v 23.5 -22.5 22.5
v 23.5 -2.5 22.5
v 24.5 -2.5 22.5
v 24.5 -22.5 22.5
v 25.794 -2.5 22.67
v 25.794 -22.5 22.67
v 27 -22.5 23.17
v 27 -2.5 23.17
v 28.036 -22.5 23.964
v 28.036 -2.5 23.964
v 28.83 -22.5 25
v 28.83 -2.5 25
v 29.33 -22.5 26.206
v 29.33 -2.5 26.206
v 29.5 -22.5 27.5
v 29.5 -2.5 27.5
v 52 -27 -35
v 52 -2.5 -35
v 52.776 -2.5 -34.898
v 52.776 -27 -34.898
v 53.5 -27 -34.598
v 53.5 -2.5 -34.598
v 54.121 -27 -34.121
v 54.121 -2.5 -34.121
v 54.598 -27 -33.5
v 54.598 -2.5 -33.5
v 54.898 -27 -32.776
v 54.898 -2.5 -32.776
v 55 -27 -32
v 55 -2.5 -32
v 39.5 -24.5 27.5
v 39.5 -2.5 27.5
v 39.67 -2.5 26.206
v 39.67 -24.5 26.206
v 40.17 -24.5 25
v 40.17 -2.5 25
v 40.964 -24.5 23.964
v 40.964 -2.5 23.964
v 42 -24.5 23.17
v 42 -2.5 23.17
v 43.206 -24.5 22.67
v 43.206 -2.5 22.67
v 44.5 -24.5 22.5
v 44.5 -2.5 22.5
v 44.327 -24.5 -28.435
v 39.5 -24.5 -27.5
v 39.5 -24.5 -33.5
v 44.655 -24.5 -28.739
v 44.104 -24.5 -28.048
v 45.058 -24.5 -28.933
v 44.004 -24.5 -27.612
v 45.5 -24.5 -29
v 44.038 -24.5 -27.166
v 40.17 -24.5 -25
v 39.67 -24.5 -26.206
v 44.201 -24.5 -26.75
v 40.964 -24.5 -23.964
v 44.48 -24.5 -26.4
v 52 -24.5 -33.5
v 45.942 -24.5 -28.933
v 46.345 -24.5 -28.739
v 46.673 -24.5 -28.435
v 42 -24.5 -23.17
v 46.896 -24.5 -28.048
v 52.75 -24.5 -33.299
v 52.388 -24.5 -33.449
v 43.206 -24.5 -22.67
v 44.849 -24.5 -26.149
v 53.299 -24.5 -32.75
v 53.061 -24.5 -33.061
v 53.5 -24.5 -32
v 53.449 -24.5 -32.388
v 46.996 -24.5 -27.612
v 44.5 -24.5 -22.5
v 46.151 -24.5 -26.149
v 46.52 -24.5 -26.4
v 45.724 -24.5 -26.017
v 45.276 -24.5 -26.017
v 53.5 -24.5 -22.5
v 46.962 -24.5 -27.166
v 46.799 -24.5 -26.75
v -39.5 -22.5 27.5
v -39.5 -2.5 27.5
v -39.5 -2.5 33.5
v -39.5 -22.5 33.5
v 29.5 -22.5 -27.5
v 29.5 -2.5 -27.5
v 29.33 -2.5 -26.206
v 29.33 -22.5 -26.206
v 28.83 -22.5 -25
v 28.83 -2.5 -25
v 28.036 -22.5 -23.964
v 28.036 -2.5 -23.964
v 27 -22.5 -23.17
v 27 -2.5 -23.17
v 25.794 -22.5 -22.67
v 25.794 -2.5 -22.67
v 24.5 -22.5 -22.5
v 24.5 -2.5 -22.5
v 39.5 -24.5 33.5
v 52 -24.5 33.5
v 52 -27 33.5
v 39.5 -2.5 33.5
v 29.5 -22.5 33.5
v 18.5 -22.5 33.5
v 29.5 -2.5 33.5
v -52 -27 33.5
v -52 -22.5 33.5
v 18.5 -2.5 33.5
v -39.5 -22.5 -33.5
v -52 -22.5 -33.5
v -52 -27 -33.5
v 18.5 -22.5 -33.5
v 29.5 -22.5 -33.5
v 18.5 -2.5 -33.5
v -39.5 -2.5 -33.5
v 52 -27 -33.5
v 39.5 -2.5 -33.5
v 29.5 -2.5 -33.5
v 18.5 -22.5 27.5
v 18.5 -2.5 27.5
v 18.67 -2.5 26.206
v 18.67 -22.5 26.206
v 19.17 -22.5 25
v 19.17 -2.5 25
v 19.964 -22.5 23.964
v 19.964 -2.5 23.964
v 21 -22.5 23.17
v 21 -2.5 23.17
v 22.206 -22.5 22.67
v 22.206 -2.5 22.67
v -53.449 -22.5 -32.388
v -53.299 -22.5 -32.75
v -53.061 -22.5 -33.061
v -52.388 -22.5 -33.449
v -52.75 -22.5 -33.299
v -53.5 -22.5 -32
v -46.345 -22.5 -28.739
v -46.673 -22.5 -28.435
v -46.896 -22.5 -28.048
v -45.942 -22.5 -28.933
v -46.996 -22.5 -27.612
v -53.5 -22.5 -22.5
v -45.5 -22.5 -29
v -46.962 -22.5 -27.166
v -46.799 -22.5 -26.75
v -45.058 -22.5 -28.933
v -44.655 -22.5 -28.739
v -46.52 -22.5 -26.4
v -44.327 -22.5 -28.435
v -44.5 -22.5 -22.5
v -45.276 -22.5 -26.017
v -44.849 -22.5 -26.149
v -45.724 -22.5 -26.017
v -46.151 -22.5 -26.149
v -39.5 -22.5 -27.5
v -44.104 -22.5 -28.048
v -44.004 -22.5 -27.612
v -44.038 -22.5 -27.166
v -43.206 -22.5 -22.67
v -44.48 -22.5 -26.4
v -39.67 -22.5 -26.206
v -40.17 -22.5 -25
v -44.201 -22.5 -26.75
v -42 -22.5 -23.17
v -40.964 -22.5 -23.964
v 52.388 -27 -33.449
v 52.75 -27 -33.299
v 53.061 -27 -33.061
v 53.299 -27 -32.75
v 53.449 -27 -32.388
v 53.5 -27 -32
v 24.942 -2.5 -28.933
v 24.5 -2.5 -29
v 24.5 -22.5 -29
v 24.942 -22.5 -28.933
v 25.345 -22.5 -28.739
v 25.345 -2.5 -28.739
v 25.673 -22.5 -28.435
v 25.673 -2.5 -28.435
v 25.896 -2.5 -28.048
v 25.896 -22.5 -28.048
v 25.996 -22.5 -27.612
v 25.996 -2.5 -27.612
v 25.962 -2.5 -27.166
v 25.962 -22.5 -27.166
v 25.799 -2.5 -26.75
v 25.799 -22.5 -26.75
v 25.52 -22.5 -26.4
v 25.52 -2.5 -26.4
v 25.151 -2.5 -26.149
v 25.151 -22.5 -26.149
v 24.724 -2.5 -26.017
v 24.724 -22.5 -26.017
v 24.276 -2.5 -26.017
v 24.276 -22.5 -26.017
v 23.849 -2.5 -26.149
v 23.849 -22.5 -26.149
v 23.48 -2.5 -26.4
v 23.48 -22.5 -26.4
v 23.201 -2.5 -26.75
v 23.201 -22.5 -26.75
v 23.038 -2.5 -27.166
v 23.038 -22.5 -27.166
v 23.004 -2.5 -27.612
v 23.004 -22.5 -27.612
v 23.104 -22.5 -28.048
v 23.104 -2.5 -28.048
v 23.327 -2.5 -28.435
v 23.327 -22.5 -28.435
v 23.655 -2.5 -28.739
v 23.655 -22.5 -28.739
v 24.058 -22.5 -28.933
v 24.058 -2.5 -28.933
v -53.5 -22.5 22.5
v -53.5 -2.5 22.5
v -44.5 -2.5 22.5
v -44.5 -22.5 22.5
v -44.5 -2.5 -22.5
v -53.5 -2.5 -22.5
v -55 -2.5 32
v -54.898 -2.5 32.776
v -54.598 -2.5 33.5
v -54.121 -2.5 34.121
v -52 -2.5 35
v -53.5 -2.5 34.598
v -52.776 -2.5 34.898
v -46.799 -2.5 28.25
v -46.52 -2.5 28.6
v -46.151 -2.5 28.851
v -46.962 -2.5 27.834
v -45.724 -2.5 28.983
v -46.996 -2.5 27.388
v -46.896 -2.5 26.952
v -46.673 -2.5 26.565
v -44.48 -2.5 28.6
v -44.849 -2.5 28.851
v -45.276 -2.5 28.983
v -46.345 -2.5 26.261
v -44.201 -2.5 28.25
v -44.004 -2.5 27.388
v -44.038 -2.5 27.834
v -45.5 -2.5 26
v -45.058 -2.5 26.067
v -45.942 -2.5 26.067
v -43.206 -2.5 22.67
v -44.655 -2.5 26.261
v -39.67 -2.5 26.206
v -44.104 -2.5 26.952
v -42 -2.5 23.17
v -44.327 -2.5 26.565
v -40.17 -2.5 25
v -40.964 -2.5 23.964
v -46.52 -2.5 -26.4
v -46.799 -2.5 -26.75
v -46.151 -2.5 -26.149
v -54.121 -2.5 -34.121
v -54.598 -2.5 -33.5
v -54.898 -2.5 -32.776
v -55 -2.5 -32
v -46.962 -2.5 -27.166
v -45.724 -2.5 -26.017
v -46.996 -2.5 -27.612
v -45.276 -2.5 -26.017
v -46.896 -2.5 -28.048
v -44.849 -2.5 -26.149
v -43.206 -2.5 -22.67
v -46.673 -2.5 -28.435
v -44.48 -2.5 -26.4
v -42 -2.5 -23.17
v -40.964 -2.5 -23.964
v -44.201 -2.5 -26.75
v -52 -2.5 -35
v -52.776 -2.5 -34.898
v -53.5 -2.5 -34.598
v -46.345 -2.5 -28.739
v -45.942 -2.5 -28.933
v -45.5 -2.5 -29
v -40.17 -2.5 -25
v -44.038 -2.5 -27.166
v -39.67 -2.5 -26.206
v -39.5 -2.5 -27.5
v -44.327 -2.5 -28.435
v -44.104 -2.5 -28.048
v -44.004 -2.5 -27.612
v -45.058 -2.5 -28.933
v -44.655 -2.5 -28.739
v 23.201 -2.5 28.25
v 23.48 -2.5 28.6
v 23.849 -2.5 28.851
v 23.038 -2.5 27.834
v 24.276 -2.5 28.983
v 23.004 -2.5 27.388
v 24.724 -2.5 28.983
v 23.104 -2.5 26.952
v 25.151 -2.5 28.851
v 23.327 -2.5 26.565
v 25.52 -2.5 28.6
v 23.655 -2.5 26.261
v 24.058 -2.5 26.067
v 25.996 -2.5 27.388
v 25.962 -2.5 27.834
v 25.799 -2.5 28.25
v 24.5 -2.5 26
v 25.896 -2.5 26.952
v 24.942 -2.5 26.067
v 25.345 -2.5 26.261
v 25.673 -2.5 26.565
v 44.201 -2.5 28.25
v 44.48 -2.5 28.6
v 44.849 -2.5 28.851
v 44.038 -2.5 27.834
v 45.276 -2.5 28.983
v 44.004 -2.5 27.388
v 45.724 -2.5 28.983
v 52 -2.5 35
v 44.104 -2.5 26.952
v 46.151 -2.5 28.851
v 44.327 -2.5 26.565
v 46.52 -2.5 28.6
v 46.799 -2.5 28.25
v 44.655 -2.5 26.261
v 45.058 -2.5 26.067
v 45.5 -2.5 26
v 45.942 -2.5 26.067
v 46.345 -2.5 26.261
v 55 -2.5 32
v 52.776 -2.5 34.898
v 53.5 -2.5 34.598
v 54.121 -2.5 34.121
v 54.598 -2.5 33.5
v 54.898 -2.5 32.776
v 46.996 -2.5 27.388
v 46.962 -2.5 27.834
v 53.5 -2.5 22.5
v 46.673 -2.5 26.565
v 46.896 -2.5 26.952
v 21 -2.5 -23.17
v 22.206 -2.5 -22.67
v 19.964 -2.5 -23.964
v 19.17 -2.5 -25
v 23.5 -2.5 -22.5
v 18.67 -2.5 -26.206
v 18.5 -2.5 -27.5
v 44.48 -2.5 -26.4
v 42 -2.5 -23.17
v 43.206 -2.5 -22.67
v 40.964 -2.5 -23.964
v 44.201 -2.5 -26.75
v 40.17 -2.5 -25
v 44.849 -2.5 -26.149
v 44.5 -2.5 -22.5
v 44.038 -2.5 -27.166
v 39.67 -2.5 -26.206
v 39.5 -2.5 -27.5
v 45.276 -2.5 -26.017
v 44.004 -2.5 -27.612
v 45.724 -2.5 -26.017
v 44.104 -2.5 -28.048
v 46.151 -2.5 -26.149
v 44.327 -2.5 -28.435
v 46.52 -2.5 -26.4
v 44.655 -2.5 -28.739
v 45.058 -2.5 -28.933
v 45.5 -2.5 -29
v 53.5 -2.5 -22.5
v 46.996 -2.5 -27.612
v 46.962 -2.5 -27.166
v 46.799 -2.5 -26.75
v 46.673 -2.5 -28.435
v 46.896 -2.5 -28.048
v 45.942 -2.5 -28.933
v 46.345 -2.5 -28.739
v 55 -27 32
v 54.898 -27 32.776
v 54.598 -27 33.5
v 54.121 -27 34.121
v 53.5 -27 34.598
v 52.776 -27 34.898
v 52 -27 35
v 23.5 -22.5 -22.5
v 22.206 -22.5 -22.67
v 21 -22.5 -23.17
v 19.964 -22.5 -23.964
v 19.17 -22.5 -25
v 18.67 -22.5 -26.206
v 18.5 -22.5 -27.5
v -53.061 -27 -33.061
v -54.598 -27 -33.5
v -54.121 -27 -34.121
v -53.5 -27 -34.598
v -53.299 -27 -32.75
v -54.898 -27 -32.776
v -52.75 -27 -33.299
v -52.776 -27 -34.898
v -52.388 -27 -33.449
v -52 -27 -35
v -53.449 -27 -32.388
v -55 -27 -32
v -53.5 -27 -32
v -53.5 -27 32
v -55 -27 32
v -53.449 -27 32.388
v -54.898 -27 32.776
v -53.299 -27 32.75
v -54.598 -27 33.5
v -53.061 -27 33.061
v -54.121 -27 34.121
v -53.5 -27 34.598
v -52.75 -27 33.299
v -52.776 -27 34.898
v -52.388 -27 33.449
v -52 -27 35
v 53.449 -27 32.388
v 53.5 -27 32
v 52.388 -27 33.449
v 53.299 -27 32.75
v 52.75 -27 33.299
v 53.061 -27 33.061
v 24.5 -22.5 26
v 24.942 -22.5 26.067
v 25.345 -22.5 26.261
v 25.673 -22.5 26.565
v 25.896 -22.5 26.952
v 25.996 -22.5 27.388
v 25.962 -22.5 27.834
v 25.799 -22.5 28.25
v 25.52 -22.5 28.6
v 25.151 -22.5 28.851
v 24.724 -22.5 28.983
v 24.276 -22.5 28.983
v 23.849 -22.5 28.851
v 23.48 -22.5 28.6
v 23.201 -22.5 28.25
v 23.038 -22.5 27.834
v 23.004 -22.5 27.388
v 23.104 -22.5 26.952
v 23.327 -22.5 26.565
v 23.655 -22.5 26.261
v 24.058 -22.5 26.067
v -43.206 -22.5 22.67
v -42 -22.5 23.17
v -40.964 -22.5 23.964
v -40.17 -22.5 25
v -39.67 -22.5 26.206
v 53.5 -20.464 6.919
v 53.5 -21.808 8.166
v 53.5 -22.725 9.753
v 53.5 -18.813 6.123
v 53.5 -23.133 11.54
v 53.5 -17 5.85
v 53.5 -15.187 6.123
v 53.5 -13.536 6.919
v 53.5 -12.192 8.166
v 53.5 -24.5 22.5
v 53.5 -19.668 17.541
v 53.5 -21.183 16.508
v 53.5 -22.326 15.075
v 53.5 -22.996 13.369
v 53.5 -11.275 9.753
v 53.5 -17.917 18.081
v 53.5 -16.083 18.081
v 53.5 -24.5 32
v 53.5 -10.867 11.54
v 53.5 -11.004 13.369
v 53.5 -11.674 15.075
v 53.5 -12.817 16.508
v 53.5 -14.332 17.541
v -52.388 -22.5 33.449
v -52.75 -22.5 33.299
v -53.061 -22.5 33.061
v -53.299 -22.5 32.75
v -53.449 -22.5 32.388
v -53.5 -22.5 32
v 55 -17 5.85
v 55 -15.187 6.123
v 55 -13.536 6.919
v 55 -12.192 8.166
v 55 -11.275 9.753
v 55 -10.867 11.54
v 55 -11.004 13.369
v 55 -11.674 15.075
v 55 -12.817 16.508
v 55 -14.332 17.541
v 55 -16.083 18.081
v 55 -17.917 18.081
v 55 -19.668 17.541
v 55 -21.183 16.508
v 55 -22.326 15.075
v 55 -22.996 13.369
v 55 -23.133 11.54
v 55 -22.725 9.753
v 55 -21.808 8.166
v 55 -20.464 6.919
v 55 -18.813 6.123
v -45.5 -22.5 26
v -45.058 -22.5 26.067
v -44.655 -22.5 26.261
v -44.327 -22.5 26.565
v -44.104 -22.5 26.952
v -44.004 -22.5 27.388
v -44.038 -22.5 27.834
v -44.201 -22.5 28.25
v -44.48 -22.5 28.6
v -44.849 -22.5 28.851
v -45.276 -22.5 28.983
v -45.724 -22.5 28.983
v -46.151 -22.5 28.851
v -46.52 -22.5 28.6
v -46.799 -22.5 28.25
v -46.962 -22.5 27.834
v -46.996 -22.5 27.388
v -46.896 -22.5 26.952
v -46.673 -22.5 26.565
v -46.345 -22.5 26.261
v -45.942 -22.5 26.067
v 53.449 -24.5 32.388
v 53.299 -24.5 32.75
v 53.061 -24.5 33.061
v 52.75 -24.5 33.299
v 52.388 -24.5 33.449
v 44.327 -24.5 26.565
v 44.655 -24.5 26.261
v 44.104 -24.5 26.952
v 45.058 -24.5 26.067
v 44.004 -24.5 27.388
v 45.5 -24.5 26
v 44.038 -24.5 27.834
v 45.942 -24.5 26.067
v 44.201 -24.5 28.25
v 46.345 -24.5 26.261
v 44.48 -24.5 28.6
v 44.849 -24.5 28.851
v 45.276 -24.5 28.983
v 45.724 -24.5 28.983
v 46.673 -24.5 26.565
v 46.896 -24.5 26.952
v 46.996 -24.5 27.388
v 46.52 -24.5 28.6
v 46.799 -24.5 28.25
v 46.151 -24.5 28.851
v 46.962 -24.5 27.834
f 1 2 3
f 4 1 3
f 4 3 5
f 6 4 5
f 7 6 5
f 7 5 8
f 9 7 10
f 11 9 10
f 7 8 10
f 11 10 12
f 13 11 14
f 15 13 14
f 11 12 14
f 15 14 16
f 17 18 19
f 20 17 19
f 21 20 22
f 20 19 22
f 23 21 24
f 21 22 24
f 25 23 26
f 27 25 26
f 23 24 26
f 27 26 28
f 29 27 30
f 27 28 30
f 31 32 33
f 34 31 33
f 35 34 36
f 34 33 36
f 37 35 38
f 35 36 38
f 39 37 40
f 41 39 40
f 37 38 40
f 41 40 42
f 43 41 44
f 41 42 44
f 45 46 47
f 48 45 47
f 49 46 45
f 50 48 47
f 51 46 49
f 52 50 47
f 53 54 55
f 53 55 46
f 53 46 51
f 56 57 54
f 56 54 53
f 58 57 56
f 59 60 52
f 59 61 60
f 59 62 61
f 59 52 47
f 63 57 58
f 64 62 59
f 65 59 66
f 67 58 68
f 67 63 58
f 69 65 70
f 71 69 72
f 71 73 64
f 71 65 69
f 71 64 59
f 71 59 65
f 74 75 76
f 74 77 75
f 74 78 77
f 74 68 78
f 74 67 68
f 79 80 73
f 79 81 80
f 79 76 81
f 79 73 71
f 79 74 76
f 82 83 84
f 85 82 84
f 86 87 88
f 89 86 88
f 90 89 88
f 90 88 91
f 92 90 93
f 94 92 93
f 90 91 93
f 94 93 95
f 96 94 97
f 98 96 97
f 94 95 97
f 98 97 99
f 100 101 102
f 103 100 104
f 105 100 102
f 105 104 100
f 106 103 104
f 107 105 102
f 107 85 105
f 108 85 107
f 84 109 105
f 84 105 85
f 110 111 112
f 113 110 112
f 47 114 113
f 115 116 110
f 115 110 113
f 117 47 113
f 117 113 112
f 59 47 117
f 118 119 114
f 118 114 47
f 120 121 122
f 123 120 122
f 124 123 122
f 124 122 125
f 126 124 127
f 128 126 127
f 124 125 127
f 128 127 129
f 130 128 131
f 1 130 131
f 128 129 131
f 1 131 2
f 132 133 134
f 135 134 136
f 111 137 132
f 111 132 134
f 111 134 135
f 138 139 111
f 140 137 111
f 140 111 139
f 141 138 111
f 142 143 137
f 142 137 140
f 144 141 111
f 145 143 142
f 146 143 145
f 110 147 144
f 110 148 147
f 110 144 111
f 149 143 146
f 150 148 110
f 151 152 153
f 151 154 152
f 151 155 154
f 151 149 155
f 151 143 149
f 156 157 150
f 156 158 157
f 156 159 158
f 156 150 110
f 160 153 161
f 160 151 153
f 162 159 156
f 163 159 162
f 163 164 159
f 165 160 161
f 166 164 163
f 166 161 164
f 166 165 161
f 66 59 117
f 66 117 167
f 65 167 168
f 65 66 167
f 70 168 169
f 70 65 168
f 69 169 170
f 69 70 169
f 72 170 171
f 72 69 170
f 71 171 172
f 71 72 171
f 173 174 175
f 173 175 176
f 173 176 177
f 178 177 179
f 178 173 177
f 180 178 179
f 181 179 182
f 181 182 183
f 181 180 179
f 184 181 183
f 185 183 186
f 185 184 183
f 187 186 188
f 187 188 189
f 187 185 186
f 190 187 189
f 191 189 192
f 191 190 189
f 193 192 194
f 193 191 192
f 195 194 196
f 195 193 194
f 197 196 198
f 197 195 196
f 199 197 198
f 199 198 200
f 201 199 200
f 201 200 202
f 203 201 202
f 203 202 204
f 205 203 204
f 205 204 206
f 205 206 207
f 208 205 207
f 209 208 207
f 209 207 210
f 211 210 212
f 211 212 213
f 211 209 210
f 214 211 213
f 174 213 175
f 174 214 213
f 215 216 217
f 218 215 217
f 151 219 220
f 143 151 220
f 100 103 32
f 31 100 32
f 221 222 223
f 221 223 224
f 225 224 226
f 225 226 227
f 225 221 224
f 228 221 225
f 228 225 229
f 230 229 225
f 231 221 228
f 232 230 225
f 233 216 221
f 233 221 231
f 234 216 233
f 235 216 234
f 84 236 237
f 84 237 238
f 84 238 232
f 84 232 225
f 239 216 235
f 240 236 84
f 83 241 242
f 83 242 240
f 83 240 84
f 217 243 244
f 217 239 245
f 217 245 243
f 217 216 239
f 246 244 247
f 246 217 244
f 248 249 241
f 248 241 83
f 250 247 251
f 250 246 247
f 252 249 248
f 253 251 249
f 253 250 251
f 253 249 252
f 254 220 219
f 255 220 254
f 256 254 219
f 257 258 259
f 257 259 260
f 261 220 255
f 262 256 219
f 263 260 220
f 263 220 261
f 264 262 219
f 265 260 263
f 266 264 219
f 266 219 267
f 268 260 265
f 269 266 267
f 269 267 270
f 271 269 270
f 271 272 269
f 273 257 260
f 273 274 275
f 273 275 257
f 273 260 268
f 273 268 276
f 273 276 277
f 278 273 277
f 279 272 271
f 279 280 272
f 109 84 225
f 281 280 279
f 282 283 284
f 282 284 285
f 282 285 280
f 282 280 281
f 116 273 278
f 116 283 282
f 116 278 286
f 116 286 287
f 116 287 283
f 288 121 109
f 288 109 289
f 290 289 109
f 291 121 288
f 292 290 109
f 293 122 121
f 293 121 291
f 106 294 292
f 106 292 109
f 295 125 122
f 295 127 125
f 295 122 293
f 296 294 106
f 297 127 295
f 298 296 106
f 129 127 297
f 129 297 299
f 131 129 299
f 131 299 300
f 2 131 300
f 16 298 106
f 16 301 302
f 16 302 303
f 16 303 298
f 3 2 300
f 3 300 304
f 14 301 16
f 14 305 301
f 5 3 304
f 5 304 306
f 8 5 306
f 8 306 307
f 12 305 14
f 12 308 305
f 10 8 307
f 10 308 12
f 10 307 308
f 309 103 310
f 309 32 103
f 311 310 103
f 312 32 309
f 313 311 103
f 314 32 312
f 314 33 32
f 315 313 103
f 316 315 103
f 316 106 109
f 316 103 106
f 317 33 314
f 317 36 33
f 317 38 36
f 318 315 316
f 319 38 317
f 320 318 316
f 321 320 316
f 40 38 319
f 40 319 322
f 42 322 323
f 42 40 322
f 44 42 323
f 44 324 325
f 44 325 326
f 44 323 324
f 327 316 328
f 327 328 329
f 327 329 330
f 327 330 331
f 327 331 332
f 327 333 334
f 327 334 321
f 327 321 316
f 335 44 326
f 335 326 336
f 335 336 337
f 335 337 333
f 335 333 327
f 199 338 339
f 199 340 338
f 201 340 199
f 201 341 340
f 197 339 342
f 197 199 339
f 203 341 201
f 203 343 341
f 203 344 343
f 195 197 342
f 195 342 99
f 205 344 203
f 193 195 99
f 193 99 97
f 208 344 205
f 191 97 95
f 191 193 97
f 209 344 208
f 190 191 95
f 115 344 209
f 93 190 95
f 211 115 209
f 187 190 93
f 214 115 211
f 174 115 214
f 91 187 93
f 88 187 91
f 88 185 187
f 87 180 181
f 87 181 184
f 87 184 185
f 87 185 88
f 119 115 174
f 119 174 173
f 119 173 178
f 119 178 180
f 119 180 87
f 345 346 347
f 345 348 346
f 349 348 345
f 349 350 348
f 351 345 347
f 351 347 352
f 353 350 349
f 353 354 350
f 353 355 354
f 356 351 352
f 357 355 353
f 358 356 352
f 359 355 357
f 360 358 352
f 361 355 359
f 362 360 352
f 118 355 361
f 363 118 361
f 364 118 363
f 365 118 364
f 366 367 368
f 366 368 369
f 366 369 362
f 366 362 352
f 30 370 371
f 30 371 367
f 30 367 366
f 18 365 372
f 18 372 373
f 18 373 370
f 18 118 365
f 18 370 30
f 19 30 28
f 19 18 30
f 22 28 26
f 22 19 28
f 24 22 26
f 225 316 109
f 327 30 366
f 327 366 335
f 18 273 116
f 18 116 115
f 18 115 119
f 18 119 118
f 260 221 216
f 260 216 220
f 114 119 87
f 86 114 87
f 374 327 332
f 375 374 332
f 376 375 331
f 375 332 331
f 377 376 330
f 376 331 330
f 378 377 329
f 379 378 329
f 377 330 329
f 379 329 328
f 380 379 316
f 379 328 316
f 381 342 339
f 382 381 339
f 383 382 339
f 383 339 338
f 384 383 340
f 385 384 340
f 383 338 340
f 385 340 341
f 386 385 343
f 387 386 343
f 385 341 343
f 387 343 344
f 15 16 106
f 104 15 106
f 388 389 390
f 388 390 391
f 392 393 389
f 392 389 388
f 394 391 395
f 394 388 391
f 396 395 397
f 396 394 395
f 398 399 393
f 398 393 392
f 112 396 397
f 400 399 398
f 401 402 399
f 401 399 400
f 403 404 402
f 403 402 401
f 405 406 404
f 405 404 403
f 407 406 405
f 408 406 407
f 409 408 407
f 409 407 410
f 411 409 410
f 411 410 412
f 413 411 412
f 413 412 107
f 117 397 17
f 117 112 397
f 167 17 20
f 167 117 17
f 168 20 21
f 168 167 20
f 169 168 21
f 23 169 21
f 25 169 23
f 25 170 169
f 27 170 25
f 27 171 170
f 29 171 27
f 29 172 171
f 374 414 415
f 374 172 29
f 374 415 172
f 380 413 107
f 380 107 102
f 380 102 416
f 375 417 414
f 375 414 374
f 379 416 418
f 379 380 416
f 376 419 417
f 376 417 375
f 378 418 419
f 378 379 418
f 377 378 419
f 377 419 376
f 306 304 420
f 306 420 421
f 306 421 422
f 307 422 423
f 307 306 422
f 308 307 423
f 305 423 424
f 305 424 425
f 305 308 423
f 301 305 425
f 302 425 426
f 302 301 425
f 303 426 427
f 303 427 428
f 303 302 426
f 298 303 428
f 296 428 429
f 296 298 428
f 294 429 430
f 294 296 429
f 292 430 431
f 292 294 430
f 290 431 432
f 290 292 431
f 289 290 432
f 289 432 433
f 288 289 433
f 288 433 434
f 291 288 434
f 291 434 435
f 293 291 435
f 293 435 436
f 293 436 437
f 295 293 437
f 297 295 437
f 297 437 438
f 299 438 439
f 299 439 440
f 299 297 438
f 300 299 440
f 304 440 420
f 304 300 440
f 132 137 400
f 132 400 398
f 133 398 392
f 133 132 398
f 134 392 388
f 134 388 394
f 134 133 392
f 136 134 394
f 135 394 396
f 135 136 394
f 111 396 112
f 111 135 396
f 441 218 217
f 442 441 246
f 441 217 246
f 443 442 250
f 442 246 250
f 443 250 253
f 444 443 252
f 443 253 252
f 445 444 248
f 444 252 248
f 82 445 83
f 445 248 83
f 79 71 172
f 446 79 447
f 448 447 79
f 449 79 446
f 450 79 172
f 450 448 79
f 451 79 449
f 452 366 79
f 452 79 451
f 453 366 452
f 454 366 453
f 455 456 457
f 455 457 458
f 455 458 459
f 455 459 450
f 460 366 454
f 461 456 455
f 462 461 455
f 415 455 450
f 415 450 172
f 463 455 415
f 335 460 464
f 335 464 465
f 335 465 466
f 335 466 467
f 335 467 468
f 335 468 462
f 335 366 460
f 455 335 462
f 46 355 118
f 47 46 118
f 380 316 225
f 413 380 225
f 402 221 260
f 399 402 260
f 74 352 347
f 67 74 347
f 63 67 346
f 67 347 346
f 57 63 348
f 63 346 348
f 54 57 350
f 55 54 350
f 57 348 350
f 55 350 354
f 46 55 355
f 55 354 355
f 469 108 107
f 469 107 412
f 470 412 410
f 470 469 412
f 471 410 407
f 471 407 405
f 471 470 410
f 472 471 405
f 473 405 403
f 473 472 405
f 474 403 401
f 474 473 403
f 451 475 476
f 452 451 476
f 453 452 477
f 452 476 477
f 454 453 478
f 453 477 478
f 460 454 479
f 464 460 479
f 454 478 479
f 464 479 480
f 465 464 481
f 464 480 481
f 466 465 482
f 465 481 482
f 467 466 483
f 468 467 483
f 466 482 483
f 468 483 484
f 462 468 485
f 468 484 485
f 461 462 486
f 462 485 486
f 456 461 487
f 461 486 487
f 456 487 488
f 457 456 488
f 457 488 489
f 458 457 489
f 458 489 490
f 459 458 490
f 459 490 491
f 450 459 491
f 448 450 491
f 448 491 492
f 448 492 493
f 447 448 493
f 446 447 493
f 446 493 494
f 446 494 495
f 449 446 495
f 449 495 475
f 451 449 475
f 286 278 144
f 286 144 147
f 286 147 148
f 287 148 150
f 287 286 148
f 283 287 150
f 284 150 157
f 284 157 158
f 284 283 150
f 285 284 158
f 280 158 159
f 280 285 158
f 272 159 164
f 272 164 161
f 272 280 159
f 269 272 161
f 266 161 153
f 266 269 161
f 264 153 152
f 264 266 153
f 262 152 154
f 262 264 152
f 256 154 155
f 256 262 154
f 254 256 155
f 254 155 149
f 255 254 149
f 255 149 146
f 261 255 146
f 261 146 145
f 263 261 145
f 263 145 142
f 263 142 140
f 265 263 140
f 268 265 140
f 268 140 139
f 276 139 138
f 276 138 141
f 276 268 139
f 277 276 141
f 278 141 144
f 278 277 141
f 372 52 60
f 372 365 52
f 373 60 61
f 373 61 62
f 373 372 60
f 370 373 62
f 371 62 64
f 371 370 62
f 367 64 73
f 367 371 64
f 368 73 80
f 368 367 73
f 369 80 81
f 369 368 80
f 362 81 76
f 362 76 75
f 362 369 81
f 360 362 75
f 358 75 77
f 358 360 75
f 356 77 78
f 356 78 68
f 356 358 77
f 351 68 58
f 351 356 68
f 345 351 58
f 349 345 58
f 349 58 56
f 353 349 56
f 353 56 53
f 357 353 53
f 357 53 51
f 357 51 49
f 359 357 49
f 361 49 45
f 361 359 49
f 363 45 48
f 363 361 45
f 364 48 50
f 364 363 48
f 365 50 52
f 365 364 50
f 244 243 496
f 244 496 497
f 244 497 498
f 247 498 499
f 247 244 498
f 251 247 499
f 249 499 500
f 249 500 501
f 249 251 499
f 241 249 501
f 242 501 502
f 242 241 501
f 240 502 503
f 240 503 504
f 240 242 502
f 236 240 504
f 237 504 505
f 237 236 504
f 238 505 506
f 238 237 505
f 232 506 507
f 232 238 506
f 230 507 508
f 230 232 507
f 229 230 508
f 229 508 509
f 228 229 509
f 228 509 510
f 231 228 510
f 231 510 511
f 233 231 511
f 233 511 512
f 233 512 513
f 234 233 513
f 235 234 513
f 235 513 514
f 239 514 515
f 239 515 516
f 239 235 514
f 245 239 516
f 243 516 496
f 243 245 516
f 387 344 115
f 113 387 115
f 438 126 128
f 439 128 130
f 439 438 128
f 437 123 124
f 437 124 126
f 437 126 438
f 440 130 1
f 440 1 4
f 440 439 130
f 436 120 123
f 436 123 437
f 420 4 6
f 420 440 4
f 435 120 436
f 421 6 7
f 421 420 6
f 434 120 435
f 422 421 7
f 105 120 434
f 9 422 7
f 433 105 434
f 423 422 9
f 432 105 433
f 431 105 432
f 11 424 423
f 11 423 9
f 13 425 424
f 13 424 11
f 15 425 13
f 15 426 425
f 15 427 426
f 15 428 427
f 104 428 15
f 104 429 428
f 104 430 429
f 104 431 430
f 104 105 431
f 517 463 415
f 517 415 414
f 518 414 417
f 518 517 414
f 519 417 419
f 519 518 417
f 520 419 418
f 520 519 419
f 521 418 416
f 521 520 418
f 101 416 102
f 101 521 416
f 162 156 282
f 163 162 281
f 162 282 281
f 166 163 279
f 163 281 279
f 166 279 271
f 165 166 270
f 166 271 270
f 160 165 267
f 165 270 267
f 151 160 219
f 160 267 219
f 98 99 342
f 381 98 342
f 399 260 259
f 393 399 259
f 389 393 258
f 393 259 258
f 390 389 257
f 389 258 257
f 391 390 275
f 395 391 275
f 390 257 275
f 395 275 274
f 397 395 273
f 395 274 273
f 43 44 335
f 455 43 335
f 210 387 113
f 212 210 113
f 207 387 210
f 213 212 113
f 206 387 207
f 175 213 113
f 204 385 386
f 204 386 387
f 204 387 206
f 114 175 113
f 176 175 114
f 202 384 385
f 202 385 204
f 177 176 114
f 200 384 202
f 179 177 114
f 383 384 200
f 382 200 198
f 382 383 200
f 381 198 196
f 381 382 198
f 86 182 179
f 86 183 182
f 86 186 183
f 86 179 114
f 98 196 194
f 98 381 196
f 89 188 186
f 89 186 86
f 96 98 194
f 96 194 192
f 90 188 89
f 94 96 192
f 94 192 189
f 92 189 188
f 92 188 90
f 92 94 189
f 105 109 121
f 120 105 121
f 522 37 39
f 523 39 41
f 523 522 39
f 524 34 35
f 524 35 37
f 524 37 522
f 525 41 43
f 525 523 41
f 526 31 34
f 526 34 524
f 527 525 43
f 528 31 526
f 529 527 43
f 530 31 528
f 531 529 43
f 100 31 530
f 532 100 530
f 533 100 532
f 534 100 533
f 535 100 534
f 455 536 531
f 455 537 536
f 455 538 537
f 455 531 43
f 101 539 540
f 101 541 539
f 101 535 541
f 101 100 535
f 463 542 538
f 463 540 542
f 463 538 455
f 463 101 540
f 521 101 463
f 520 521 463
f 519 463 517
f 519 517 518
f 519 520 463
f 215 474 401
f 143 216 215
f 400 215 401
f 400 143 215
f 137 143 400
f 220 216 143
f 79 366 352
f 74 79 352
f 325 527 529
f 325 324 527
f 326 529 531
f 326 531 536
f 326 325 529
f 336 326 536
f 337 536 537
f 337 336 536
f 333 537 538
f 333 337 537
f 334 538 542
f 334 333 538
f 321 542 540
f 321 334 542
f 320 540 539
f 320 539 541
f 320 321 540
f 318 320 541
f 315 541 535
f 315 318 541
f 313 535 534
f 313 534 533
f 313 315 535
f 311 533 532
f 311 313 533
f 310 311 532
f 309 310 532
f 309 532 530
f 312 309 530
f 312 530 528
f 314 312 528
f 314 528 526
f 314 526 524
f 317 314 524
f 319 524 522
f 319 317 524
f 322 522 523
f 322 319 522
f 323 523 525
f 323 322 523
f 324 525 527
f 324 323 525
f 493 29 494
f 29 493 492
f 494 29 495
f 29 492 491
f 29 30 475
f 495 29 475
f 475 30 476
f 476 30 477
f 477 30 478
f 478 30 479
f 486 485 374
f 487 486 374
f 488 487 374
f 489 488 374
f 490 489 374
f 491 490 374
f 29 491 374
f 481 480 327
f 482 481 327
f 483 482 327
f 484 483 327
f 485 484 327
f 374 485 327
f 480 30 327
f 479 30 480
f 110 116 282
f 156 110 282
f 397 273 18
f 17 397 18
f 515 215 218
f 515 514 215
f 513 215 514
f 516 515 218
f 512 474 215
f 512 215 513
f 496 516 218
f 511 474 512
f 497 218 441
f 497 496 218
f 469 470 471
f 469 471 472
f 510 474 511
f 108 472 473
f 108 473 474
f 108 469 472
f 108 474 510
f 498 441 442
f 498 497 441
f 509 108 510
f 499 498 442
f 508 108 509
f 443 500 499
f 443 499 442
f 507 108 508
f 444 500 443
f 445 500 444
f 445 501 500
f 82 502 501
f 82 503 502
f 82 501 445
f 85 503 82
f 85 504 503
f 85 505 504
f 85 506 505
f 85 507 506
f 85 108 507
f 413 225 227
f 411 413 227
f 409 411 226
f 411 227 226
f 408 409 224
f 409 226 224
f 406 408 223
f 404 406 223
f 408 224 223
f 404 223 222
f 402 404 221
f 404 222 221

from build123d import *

# Parameters (mm, degrees)
BOSS_EXTRUDE1_DEPTH  = 2.5
BOSS_EXTRUDE6_DEPTH  = 24.5
CUT_EXTRUDE7_REACH   = 72.562
SKETCH3_R            = 2.5
BOSS_EXTRUDE11_START = -24.5
SKETCH12_R           = 1.5
BOSS_EXTRUDE11_DEPTH = 20
CUT_EXTRUDE11_REACH  = 120.55
SKETCH13_R           = 6.15
BOSS_EXTRUDE13_START = -4.5
SKETCH12_5_R         = 1.5
BOSS_EXTRUDE13_DEPTH = 2
CUT_EXTRUDE13_DEPTH  = 2.5


with BuildPart() as part:
    # Sketch1 → Boss-Extrude1 (new body)
    with BuildSketch(Plane(origin=(0, 0, 0), x_dir=(1, 0, 0), z_dir=(0, 1, 0))):
        with BuildLine():
            Line((-52, -35), (52, -35))
            ThreePointArc((52, -35), (54.121320344, -34.121320344), (55, -32))
            Line((55, -32), (55, 32))
            ThreePointArc((55, 32), (54.121320344, 34.121320344), (52, 35))
            Line((52, 35), (-52, 35))
            ThreePointArc((-52, 35), (-54.121320344, 34.121320344), (-55, 32))
            Line((-55, 32), (-55, -32))
            ThreePointArc((-55, -32), (-54.121320344, -34.121320344), (-52, -35))
        make_face()
    extrude(amount=-BOSS_EXTRUDE1_DEPTH)

    # Sketch7 → Boss-Extrude6 (add)
    with BuildSketch(Plane.XZ.offset(2.5)):
        with BuildLine():
            Line((-55, 32), (-55, -32))
            ThreePointArc((-55, -32), (-54.121320344, -34.121320344), (-52, -35))
            Line((-52, -35), (52, -35))
            ThreePointArc((52, -35), (54.121320344, -34.121320344), (55, -32))
            Line((55, -32), (55, 32))
            ThreePointArc((55, 32), (54.121320344, 34.121320344), (52, 35))
            Line((52, 35), (-52, 35))
            ThreePointArc((-52, 35), (-54.121320344, 34.121320344), (-55, 32))
        make_face()
        with BuildLine():
            Line((-53.5, 32), (-53.5, -32))
            ThreePointArc((-53.5, -32), (-53.060660172, -33.060660172), (-52, -33.5))
            Line((-52, -33.5), (52, -33.5))
            ThreePointArc((52, -33.5), (53.060660172, -33.060660172), (53.5, -32))
            Line((53.5, -32), (53.5, 32))
            ThreePointArc((53.5, 32), (53.060660172, 33.060660172), (52, 33.5))
            Line((52, 33.5), (-52, 33.5))
            ThreePointArc((-52, 33.5), (-53.060660172, 33.060660172), (-53.5, 32))
        make_face(mode=Mode.SUBTRACT)
    extrude(amount=BOSS_EXTRUDE6_DEPTH)

    # Sketch3 → Cut-Extrude7 (cut, up to next)
    with BuildSketch(Plane(origin=(0, 0, 0), x_dir=(1, 0, 0), z_dir=(0, 1, 0)), mode=Mode.PRIVATE) as cut_extrude7_sk1:
        with Locations(Location((-20.1, -27.5, 0), (0, 0, 270))):
            Circle(SKETCH3_R)
    cut_extrude7_tool1 = extrude(cut_extrude7_sk1.sketch, amount=-CUT_EXTRUDE7_REACH, mode=Mode.PRIVATE) & part.part
    # Sketch3 → Cut-Extrude7 (cut, up to next)
    with BuildSketch(Plane(origin=(0, 0, 0), x_dir=(1, 0, 0), z_dir=(0, 1, 0)), mode=Mode.PRIVATE) as cut_extrude7_sk2:
        with Locations(Location((-9.6, -27.5, 0), (0, 0, 270))):
            Circle(SKETCH3_R)
    cut_extrude7_tool2 = extrude(cut_extrude7_sk2.sketch, amount=-CUT_EXTRUDE7_REACH, mode=Mode.PRIVATE) & part.part
    # Sketch3 → Cut-Extrude7 (cut, up to next)
    with BuildSketch(Plane(origin=(0, 0, 0), x_dir=(1, 0, 0), z_dir=(0, 1, 0)), mode=Mode.PRIVATE) as cut_extrude7_sk3:
        with Locations(Location((0.5, -27.5, 0), (0, 0, 270))):
            Circle(SKETCH3_R)
    cut_extrude7_tool3 = extrude(cut_extrude7_sk3.sketch, amount=-CUT_EXTRUDE7_REACH, mode=Mode.PRIVATE) & part.part
    # Sketch3 → Cut-Extrude7 (cut, up to next)
    with BuildSketch(Plane(origin=(0, 0, 0), x_dir=(1, 0, 0), z_dir=(0, 1, 0)), mode=Mode.PRIVATE) as cut_extrude7_sk4:
        with Locations(Location((10.5, -27.5, 0), (0, 0, 270))):
            Circle(SKETCH3_R)
    cut_extrude7_tool4 = extrude(cut_extrude7_sk4.sketch, amount=-CUT_EXTRUDE7_REACH, mode=Mode.PRIVATE) & part.part
    add(cut_extrude7_tool1.solids().sort_by_distance((-20.1, 0, 27.5))[0], mode=Mode.SUBTRACT)
    add(cut_extrude7_tool2.solids().sort_by_distance((-9.6, 0, 27.5))[0], mode=Mode.SUBTRACT)
    add(cut_extrude7_tool3.solids().sort_by_distance((0.5, 0, 27.5))[0], mode=Mode.SUBTRACT)
    add(cut_extrude7_tool4.solids().sort_by_distance((10.5, 0, 27.5))[0], mode=Mode.SUBTRACT)

    # Sketch12 → Boss-Extrude11 (add)
    # profile 1 of 6: a face of its own
    with BuildSketch(Plane.XZ.offset(27).offset(BOSS_EXTRUDE11_START)):
        with BuildLine():
            Line((-39.5, 27.5), (-39.5, 33.5))
            Line((-39.5, 33.5), (-52, 33.5))
            ThreePointArc((-52, 33.5), (-53.060660172, 33.060660172), (-53.5, 32))
            Line((-53.5, 32), (-53.5, 22.5))
            Line((-53.5, 22.5), (-44.5, 22.5))
            ThreePointArc((-44.5, 22.5), (-40.964466094, 23.964466094), (-39.5, 27.5))
        make_face()
        with Locations(Location((-45.5, 27.5, 0), (0, 0, 270))):
            Circle(SKETCH12_R, mode=Mode.SUBTRACT)
    # profile 2 of 6: a face of its own
    with BuildSketch(Plane.XZ.offset(27).offset(BOSS_EXTRUDE11_START)):
        with BuildLine():
            Line((29.5, 33.5), (18.5, 33.5))
            Line((18.5, 33.5), (18.5, 27.5))
            ThreePointArc((18.5, 27.5), (19.964466094, 23.964466094), (23.5, 22.5))
            Line((23.5, 22.5), (24.5, 22.5))
            ThreePointArc((24.5, 22.5), (28.035533906, 23.964466094), (29.5, 27.5))
            Line((29.5, 27.5), (29.5, 33.5))
        make_face()
        with Locations(Location((24.5, 27.5, 0), (0, 0, 270))):
            Circle(SKETCH12_R, mode=Mode.SUBTRACT)
    # profile 3 of 6: a face of its own
    with BuildSketch(Plane.XZ.offset(27).offset(BOSS_EXTRUDE11_START)):
        with BuildLine():
            Line((18.5, -27.5), (18.5, -33.5))
            Line((18.5, -33.5), (29.5, -33.5))
            Line((29.5, -33.5), (29.5, -27.5))
            ThreePointArc((29.5, -27.5), (28.035533906, -23.964466094), (24.5, -22.5))
            Line((24.5, -22.5), (23.5, -22.5))
            ThreePointArc((23.5, -22.5), (19.964466094, -23.964466094), (18.5, -27.5))
        make_face()
        with Locations(Location((24.5, -27.5, 0), (0, 0, 270))):
            Circle(SKETCH12_R, mode=Mode.SUBTRACT)
    # profile 4 of 6: a face of its own
    with BuildSketch(Plane.XZ.offset(27).offset(BOSS_EXTRUDE11_START)):
        with BuildLine():
            Line((-44.5, -22.5), (-53.5, -22.5))
            Line((-53.5, -22.5), (-53.5, -32))
            ThreePointArc((-53.5, -32), (-53.060660172, -33.060660172), (-52, -33.5))
            Line((-52, -33.5), (-39.5, -33.5))
            Line((-39.5, -33.5), (-39.5, -27.5))
            ThreePointArc((-39.5, -27.5), (-40.964466094, -23.964466094), (-44.5, -22.5))
        make_face()
        with Locations(Location((-45.5, -27.5, 0), (0, 0, 270))):
            Circle(SKETCH12_R, mode=Mode.SUBTRACT)
    # profile 5 of 6: a face of its own
    with BuildSketch(Plane.XZ.offset(27).offset(BOSS_EXTRUDE11_START)):
        with BuildLine():
            Line((52, 33.5), (39.5, 33.5))
            Line((39.5, 33.5), (39.5, 27.5))
            ThreePointArc((39.5, 27.5), (40.964466094, 23.964466094), (44.5, 22.5))
            Line((44.5, 22.5), (53.5, 22.5))
            Line((53.5, 22.5), (53.5, 32))
            ThreePointArc((53.5, 32), (53.060660172, 33.060660172), (52, 33.5))
        make_face()
        with Locations(Location((45.5, 27.5, 0), (0, 0, 270))):
            Circle(SKETCH12_R, mode=Mode.SUBTRACT)
    # profile 6 of 6: a face of its own
    with BuildSketch(Plane.XZ.offset(27).offset(BOSS_EXTRUDE11_START)):
        with BuildLine():
            Line((53.5, -32), (53.5, -22.5))
            Line((53.5, -22.5), (44.5, -22.5))
            ThreePointArc((44.5, -22.5), (40.964466094, -23.964466094), (39.5, -27.5))
            Line((39.5, -27.5), (39.5, -33.5))
            Line((39.5, -33.5), (52, -33.5))
            ThreePointArc((52, -33.5), (53.060660172, -33.060660172), (53.5, -32))
        make_face()
        with Locations(Location((45.5, -27.5, 0), (0, 0, 270))):
            Circle(SKETCH12_R, mode=Mode.SUBTRACT)
    extrude(amount=BOSS_EXTRUDE11_DEPTH)

    # Sketch13 → Cut-Extrude11 (cut, up to next)
    with BuildSketch(Plane(origin=(55, 0, 0), x_dir=(0, 0, -1), z_dir=(1, 0, 0)), mode=Mode.PRIVATE) as cut_extrude11_sk1:
        with Locations((-12, -17)):
            Circle(SKETCH13_R)
    cut_extrude11_tool1 = extrude(cut_extrude11_sk1.sketch, amount=-CUT_EXTRUDE11_REACH, mode=Mode.PRIVATE) & part.part
    add(cut_extrude11_tool1.solids().sort_by_distance((55, -17, 12))[0], mode=Mode.SUBTRACT)

    # Sketch12<5> → Boss-Extrude13 (add)
    # profile 1 of 2: a face of its own
    with BuildSketch(Plane.XZ.offset(27).offset(BOSS_EXTRUDE13_START)):
        with BuildLine():
            Line((44.5, 22.5), (53.5, 22.5))
            Line((53.5, 22.5), (53.5, 32))
            ThreePointArc((53.5, 32), (53.060660172, 33.060660172), (52, 33.5))
            Line((52, 33.5), (39.5, 33.5))
            Line((39.5, 33.5), (39.5, 27.5))
            ThreePointArc((39.5, 27.5), (40.964466094, 23.964466094), (44.5, 22.5))
        make_face()
        with Locations(Location((45.5, 27.5, 0), (0, 0, 270))):
            Circle(SKETCH12_5_R, mode=Mode.SUBTRACT)
    # profile 2 of 2: a face of its own
    with BuildSketch(Plane.XZ.offset(27).offset(BOSS_EXTRUDE13_START)):
        with BuildLine():
            Line((39.5, -27.5), (39.5, -33.5))
            Line((39.5, -33.5), (52, -33.5))
            ThreePointArc((52, -33.5), (53.060660172, -33.060660172), (53.5, -32))
            Line((53.5, -32), (53.5, -22.5))
            Line((53.5, -22.5), (44.5, -22.5))
            ThreePointArc((44.5, -22.5), (40.964466094, -23.964466094), (39.5, -27.5))
        make_face()
        with Locations(Location((45.5, -27.5, 0), (0, 0, 270))):
            Circle(SKETCH12_5_R, mode=Mode.SUBTRACT)
    extrude(amount=BOSS_EXTRUDE13_DEPTH)

    # Sketch14 → Cut-Extrude13 (cut)
    with BuildSketch(Plane(origin=(0, 0, 0), x_dir=(1, 0, 0), z_dir=(0, 1, 0))):
        with BuildLine():
            Line((-52, -35), (52, -35))
            ThreePointArc((52, -35), (54.121320344, -34.121320344), (55, -32))
            Line((55, -32), (55, 32))
            ThreePointArc((55, 32), (54.121320344, 34.121320344), (52, 35))
            Line((52, 35), (-52, 35))
            ThreePointArc((-52, 35), (-54.121320344, 34.121320344), (-55, 32))
            Line((-55, 32), (-55, -32))
            ThreePointArc((-55, -32), (-54.121320344, -34.121320344), (-52, -35))
        make_face()
    extrude(amount=-CUT_EXTRUDE13_DEPTH, mode=Mode.SUBTRACT)


solid = part.part
